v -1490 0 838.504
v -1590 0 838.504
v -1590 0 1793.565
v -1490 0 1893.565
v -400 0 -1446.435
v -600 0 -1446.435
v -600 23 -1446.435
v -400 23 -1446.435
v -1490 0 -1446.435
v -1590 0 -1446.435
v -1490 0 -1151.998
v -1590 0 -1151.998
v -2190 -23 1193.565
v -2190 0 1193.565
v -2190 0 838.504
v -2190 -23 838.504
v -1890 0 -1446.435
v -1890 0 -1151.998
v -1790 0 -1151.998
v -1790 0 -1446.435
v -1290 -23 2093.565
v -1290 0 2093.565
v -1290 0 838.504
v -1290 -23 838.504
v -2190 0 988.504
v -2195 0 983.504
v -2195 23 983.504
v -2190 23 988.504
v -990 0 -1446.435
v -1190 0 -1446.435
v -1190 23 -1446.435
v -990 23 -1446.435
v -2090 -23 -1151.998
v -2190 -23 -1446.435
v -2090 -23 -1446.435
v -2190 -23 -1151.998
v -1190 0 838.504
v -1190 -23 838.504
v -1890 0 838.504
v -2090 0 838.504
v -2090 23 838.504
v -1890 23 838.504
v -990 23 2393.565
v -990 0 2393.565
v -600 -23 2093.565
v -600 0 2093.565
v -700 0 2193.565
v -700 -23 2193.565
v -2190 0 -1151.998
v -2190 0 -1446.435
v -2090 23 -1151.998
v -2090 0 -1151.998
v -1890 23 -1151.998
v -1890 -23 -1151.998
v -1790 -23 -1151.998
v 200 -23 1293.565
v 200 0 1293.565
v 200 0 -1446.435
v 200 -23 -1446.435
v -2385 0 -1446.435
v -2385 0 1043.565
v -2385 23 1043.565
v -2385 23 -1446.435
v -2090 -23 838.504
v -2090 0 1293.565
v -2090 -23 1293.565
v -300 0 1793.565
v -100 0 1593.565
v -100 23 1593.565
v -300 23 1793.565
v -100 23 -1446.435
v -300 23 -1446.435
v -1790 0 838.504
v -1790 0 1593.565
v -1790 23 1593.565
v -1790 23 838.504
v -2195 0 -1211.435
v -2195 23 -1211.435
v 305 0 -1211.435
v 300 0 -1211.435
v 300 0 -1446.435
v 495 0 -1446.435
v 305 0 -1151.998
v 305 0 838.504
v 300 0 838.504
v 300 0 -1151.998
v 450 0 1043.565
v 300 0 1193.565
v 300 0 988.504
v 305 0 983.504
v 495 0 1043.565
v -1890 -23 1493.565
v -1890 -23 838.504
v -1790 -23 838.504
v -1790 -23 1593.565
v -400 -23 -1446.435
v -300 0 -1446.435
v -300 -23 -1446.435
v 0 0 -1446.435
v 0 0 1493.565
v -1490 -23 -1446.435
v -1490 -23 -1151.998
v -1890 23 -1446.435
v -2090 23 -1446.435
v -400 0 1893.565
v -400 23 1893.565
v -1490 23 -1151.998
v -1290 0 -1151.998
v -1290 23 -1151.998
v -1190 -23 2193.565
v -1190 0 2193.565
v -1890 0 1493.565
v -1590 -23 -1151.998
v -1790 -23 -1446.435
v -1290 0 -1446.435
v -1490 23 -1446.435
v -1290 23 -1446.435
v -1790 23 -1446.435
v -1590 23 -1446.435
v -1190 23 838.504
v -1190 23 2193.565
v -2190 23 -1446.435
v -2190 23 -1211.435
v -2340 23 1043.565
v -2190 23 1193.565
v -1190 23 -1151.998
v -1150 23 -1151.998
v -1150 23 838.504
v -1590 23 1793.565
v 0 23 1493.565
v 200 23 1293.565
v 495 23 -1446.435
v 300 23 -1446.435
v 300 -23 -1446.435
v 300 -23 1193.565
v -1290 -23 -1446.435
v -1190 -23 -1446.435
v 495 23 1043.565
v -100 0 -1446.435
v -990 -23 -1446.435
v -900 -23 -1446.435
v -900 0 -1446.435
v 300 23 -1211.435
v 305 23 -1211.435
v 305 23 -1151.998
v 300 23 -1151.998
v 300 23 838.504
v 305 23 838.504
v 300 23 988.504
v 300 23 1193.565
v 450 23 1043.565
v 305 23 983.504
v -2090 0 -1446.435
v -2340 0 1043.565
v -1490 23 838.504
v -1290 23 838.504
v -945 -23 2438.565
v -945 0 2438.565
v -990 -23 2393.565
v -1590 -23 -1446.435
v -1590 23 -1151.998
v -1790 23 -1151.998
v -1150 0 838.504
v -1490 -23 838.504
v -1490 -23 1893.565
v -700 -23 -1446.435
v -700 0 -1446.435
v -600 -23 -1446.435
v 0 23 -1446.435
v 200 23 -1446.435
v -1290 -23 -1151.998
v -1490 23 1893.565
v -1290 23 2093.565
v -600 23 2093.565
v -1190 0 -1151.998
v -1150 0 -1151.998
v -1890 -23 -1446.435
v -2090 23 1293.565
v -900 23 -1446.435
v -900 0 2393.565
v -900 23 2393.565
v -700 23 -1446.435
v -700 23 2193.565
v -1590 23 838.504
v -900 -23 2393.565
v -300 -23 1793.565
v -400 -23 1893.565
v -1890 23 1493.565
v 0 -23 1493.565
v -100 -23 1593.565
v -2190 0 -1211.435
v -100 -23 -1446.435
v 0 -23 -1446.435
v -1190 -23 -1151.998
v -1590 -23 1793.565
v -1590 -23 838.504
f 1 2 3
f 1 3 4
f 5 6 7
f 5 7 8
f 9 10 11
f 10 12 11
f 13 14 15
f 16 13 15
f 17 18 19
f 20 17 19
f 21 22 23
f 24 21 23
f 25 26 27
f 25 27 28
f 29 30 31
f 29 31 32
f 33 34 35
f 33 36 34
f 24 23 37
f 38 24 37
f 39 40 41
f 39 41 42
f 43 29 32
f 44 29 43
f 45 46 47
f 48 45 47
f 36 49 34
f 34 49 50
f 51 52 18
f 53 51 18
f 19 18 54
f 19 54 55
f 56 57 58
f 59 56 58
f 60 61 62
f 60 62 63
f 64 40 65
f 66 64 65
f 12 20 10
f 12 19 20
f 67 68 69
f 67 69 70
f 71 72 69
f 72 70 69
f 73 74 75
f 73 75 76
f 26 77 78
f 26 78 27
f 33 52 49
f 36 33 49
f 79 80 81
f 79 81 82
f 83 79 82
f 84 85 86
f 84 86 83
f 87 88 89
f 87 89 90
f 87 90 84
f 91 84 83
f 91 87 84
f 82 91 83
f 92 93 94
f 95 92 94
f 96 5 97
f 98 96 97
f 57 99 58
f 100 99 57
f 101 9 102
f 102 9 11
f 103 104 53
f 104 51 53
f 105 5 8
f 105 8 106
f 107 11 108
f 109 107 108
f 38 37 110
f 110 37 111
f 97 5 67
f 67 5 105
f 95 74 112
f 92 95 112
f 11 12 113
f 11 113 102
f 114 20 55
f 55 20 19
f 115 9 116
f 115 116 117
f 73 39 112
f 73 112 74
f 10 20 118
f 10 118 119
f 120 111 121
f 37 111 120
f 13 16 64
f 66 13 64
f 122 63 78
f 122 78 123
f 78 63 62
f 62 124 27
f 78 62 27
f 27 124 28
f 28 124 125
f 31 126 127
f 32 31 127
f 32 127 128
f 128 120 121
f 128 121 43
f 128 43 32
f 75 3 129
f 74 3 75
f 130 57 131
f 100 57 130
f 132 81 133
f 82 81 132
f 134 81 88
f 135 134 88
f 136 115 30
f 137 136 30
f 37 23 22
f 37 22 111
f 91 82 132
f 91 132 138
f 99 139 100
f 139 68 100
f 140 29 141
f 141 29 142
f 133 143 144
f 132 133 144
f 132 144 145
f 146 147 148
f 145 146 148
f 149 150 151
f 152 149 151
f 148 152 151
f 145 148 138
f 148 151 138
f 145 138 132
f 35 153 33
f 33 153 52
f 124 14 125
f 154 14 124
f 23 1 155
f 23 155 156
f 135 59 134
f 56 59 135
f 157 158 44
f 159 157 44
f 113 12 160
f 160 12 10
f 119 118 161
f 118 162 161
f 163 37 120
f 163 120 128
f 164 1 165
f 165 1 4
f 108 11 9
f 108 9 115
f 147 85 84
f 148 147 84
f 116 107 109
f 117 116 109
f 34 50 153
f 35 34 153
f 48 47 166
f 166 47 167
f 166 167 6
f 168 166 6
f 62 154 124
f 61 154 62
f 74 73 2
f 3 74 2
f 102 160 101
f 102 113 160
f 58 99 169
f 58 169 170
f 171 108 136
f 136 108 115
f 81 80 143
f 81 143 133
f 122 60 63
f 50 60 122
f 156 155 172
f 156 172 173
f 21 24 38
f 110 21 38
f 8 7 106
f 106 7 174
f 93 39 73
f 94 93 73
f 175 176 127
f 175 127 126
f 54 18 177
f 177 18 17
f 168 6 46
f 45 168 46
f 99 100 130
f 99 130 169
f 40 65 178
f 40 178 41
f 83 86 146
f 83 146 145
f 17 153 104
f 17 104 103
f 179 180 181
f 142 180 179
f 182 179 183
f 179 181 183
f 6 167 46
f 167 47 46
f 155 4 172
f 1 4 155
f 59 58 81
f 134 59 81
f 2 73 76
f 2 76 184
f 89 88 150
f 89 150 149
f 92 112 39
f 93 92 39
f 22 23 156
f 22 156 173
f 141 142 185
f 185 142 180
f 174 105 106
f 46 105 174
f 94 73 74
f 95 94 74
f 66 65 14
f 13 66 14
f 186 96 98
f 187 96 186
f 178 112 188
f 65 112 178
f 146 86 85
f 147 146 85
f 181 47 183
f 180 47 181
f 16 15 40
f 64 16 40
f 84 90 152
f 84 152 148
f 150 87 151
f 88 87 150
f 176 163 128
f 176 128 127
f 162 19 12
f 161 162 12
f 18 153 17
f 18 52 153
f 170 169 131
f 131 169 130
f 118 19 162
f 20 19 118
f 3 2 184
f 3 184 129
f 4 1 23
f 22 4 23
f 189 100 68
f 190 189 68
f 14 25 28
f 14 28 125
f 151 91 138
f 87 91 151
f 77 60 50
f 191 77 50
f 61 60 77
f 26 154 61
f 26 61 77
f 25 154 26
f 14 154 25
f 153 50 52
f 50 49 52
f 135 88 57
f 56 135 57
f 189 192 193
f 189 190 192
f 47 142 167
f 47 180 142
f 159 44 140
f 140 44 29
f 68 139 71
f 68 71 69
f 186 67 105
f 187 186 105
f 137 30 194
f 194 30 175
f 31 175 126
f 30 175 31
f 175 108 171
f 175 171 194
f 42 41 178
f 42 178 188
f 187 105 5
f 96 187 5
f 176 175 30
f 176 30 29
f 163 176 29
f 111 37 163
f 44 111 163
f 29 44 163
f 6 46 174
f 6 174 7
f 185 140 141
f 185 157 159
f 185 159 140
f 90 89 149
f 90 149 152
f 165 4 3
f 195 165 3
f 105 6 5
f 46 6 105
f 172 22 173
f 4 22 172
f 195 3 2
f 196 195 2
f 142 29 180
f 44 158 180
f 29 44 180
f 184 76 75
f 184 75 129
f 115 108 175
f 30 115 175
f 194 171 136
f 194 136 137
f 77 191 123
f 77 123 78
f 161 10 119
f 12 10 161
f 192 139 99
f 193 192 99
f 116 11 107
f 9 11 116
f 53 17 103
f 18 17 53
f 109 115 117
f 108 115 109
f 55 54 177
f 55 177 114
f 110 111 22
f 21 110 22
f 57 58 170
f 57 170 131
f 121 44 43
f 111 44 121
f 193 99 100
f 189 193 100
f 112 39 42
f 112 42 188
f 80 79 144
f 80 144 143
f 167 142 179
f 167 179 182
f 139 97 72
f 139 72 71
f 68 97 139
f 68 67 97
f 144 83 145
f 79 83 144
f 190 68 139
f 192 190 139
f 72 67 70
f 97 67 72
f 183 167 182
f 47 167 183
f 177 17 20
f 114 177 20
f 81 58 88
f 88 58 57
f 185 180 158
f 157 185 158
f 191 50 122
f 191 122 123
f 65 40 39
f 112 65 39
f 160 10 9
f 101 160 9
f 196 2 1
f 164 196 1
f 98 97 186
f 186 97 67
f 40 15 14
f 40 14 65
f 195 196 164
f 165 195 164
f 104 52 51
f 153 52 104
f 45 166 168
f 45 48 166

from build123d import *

# Parameters (mm, degrees)
F0_W     = 5
F0_H     = 1990.5023168359
F0_W_2   = 150
F0_H_2   = 90
F1_DEPTH = 23
F0_W_3   = 200
F0_H_3   = 60.0609665441
F0_H_4   = 145
F0_H_5   = 59.43671662
F0_W_4   = 60
F0_W_5   = 40
F0_W_6   = 100
F2_DEPTH = 23
F0_W_7   = 90


with BuildPart() as f1:
    # F0 (on Front) → F1 (new body)
    with BuildSketch(Plane.XZ):
        Polygon((450, 1043.5651211104), (450, -1356.4348788896), (450, -1446.4348788896), (495, -1446.4348788896), (495, 1043.5651211104), align=None)
        Polygon((300, -1211.4348788896), (300, -1356.4348788896), (450, -1356.4348788896), (450, 1043.5651211104), (300, 1043.5651211104), (300, 988.5041545663), (305, 983.5041545663), (305, 838.5041545663), (305, -1151.9981622696), (305, -1211.4348788896), align=None)
        with Locations((302.5, -156.7470038516)):
            Rectangle(F0_W, F0_H)
        Polygon((450, 1043.5651211104), (300, 1193.5651211104), (300, 1043.5651211104), align=None)
        with Locations((375, -1401.4348788896)):
            Rectangle(F0_W_2, F0_H_2)
    extrude(amount=-F1_DEPTH)


with BuildPart() as f1b:
    # F0 (on Front) → F1, piece 2 (new body)
    with BuildSketch(Plane.XZ):
        Polygon((200, 1293.5651211104), (0, 1493.5651211104), (0, 1288.5041545663), (200, 1088.5041545663), align=None)
        Polygon((0, 1288.5041545663), (0, 1043.5651211104), (200, 1043.5651211104), (200, 1088.5041545663), align=None)
        with Locations((100, 1013.5346378384)):
            Rectangle(F0_W_3, F0_H_3)
        with Locations((100, 911.0041545663)):
            Rectangle(F0_W_3, F0_H_4)
        with Locations((100, -156.7470038516)):
            Rectangle(F0_W_3, F0_H)
        with Locations((100, -1181.7165205796)):
            Rectangle(F0_W_3, F0_H_5)
        with Locations((100, -1283.9348788896)):
            Rectangle(F0_W_3, F0_H_4)
        with Locations((100, -1401.4348788896)):
            Rectangle(F0_W_3, F0_H_2)
    extrude(amount=-F1_DEPTH)


with BuildPart() as f1c:
    # F0 (on Front) → F1, piece 3 (new body)
    with BuildSketch(Plane.XZ):
        with Locations((-200, -1401.4348788896)):
            Rectangle(F0_W_3, F0_H_2)
        with Locations((-200, -1283.9348788896)):
            Rectangle(F0_W_3, F0_H_4)
        with Locations((-200, -1181.7165205796)):
            Rectangle(F0_W_3, F0_H_5)
        with Locations((-200, -156.7470038516)):
            Rectangle(F0_W_3, F0_H)
        with Locations((-200, 911.0041545663)):
            Rectangle(F0_W_3, F0_H_4)
        with Locations((-200, 1013.5346378384)):
            Rectangle(F0_W_3, F0_H_3)
        Polygon((-300, 1588.5041545663), (-300, 1043.5651211104), (-100, 1043.5651211104), (-100, 1388.5041545663), align=None)
        Polygon((-100, 1593.5651211104), (-300, 1793.5651211104), (-300, 1588.5041545663), (-100, 1388.5041545663), align=None)
    extrude(amount=-F1_DEPTH)


with BuildPart() as f1d:
    # F0 (on Front) → F1, piece 4 (new body)
    with BuildSketch(Plane.XZ):
        Polygon((-400, 1893.5651211104), (-600, 2093.5651211104), (-600, 1888.5041545663), (-400, 1688.5041545663), align=None)
        Polygon((-600, 1888.5041545663), (-600, 1043.5651211104), (-400, 1043.5651211104), (-400, 1688.5041545663), align=None)
        with Locations((-500, 1013.5346378384)):
            Rectangle(F0_W_3, F0_H_3)
        with Locations((-500, 911.0041545663)):
            Rectangle(F0_W_3, F0_H_4)
        with Locations((-500, -156.7470038516)):
            Rectangle(F0_W_3, F0_H)
        with Locations((-500, -1181.7165205796)):
            Rectangle(F0_W_3, F0_H_5)
        with Locations((-500, -1283.9348788896)):
            Rectangle(F0_W_3, F0_H_4)
        with Locations((-500, -1401.4348788896)):
            Rectangle(F0_W_3, F0_H_2)
    extrude(amount=-F1_DEPTH)


with BuildPart() as f1e:
    # F0 (on Front) → F1, piece 5 (new body)
    with BuildSketch(Plane.XZ):
        with Locations((-800, -1401.4348788896)):
            Rectangle(F0_W_3, F0_H_2)
        with Locations((-800, -1283.9348788896)):
            Rectangle(F0_W_3, F0_H_4)
        with Locations((-800, -1181.7165205796)):
            Rectangle(F0_W_3, F0_H_5)
        with Locations((-800, -156.7470038516)):
            Rectangle(F0_W_3, F0_H)
        with Locations((-800, 911.0041545663)):
            Rectangle(F0_W_3, F0_H_4)
        with Locations((-800, 1013.5346378384)):
            Rectangle(F0_W_3, F0_H_3)
        Polygon((-900, 2188.5041545663), (-900, 1043.5651211104), (-700, 1043.5651211104), (-700, 1988.5041545663), align=None)
        Polygon((-700, 2193.5651211104), (-900, 2393.5651211104), (-900, 2188.5041545663), (-700, 1988.5041545663), align=None)
    extrude(amount=-F1_DEPTH)


with BuildPart() as f1f:
    # F0 (on Front) → F1, piece 6 (new body)
    with BuildSketch(Plane.XZ):
        Polygon((-990, 2393.5651211104), (-1190, 2193.5651211104), (-1190, 1988.5041545663), (-990, 2188.5041545663), align=None)
        Polygon((-1190, 1988.5041545663), (-1190, 1043.5651211104), (-990, 1043.5651211104), (-990, 2188.5041545663), align=None)
        with Locations((-1090, 1013.5346378384)):
            Rectangle(F0_W_3, F0_H_3)
        Polygon((-990, 983.5041545663), (-1190, 983.5041545663), (-1190, 838.5041545663), (-1150, 838.5041545663), (-990, 838.5041545663), align=None)
        Polygon((-990, -1151.9981622696), (-990, 838.5041545663), (-1150, 838.5041545663), (-1150, 793.5041545663), (-1150, -1106.9981622696), (-1150, -1151.9981622696), align=None)
        with Locations((-1090, -1283.9348788896)):
            Rectangle(F0_W_3, F0_H_4)
        Polygon((-1190, -1151.9981622696), (-1190, -1211.4348788896), (-990, -1211.4348788896), (-990, -1151.9981622696), (-1150, -1151.9981622696), align=None)
        with Locations((-1090, -1401.4348788896)):
            Rectangle(F0_W_3, F0_H_2)
    extrude(amount=-F1_DEPTH)


with BuildPart() as f1g:
    # F0 (on Front) → F1, piece 7 (new body)
    with BuildSketch(Plane.XZ):
        with Locations((-1390, -1283.9348788896)):
            Rectangle(F0_W_3, F0_H_4)
        with Locations((-1390, -1181.7165205796)):
            Rectangle(F0_W_3, F0_H_5)
        with Locations((-1390, -1401.4348788896)):
            Rectangle(F0_W_3, F0_H_2)
    extrude(amount=-F1_DEPTH)


with BuildPart() as f1h:
    # F0 (on Front) → F1, piece 8 (new body)
    with BuildSketch(Plane.XZ):
        with Locations((-1690, -1401.4348788896)):
            Rectangle(F0_W_3, F0_H_2)
        with Locations((-1690, -1283.9348788896)):
            Rectangle(F0_W_3, F0_H_4)
        with Locations((-1690, -1181.7165205796)):
            Rectangle(F0_W_3, F0_H_5)
    extrude(amount=-F1_DEPTH)


with BuildPart() as f1i:
    # F0 (on Front) → F1, piece 9 (new body)
    with BuildSketch(Plane.XZ):
        with Locations((-1990, -1401.4348788896)):
            Rectangle(F0_W_3, F0_H_2)
        with Locations((-1990, -1283.9348788896)):
            Rectangle(F0_W_3, F0_H_4)
        with Locations((-1990, -1181.7165205796)):
            Rectangle(F0_W_3, F0_H_5)
    extrude(amount=-F1_DEPTH)


with BuildPart() as f1j:
    # F0 (on Front) → F1, piece 10 (new body)
    with BuildSketch(Plane.XZ):
        with Locations((-2265, -1401.4348788896)):
            Rectangle(F0_W_2, F0_H_2)
        Polygon((-2340, -1356.4348788896), (-2340, 1043.5651211104), (-2385, 1043.5651211104), (-2385, -1446.4348788896), (-2340, -1446.4348788896), align=None)
        Polygon((-2190, 1043.5651211104), (-2340, 1043.5651211104), (-2340, -1356.4348788896), (-2190, -1356.4348788896), (-2190, -1211.4348788896), (-2195, -1211.4348788896), (-2195, -1151.9981622696), (-2195, 838.5041545663), (-2195, 983.5041545663), (-2190, 988.5041545663), align=None)
        Polygon((-2190, 1193.5651211104), (-2340, 1043.5651211104), (-2190, 1043.5651211104), align=None)
    extrude(amount=-F1_DEPTH)


with BuildPart() as f1k:
    # F0 (on Front) → F1, piece 11 (new body)
    with BuildSketch(Plane.XZ):
        Polygon((-1890, 1493.5651211104), (-2090, 1293.5651211104), (-2090, 1088.5041545663), (-1890, 1288.5041545663), align=None)
        Polygon((-2090, 1088.5041545663), (-2090, 1043.5651211104), (-1890, 1043.5651211104), (-1890, 1288.5041545663), align=None)
        with Locations((-1990, 1013.5346378384)):
            Rectangle(F0_W_3, F0_H_3)
        with Locations((-1990, 911.0041545663)):
            Rectangle(F0_W_3, F0_H_4)
    extrude(amount=-F1_DEPTH)


with BuildPart() as f1l:
    # F0 (on Front) → F1, piece 12 (new body)
    with BuildSketch(Plane.XZ):
        Polygon((-1790, 1388.5041545663), (-1790, 1043.5651211104), (-1590, 1043.5651211104), (-1590, 1588.5041545663), align=None)
        Polygon((-1590, 1793.5651211104), (-1790, 1593.5651211104), (-1790, 1388.5041545663), (-1590, 1588.5041545663), align=None)
        with Locations((-1690, 1013.5346378384)):
            Rectangle(F0_W_3, F0_H_3)
        with Locations((-1690, 911.0041545663)):
            Rectangle(F0_W_3, F0_H_4)
    extrude(amount=-F1_DEPTH)


with BuildPart() as f1m:
    # F0 (on Front) → F1, piece 13 (new body)
    with BuildSketch(Plane.XZ):
        Polygon((-1490, 1688.5041545663), (-1490, 1043.5651211104), (-1290, 1043.5651211104), (-1290, 1888.5041545663), align=None)
        Polygon((-1290, 2093.5651211104), (-1490, 1893.5651211104), (-1490, 1688.5041545663), (-1290, 1888.5041545663), align=None)
        with Locations((-1390, 1013.5346378384)):
            Rectangle(F0_W_3, F0_H_3)
        with Locations((-1390, 911.0041545663)):
            Rectangle(F0_W_3, F0_H_4)
    extrude(amount=-F1_DEPTH)


with BuildPart() as f2:
    # F0 (on Front) → F2 (new body)
    with BuildSketch(Plane.XZ):
        Polygon((300, 1193.5651211104), (200, 1293.5651211104), (200, 1088.5041545663), (244.9390334559, 1043.5651211104), (300, 1043.5651211104), align=None)
        Polygon((244.9390334559, 1043.5651211104), (200, 1043.5651211104), (200, 983.5041545663), (300, 983.5041545663), (300, 988.5041545663), align=None)
        Polygon((200, 1088.5041545663), (200, 1043.5651211104), (244.9390334559, 1043.5651211104), align=None)
        Polygon((300, 1043.5651211104), (244.9390334559, 1043.5651211104), (300, 988.5041545663), align=None)
        Polygon((300, 983.5041545663), (200, 983.5041545663), (200, 838.5041545663), (260, 838.5041545663), (300, 838.5041545663), align=None)
        with Locations((230, -156.7470038516)):
            Rectangle(F0_W_4, F0_H)
        with Locations((280, -156.7470038516)):
            Rectangle(F0_W_5, F0_H)
        Polygon((200, -1151.9981622696), (200, -1211.4348788896), (300, -1211.4348788896), (300, -1151.9981622696), (260, -1151.9981622696), align=None)
        with Locations((250, -1283.9348788896)):
            Rectangle(F0_W_6, F0_H_4)
        with Locations((250, -1401.4348788896)):
            Rectangle(F0_W_6, F0_H_2)
    extrude(amount=F2_DEPTH)


with BuildPart() as f2b:
    # F0 (on Front) → F2, piece 2 (new body)
    with BuildSketch(Plane.XZ):
        with Locations((-50, -1401.4348788896)):
            Rectangle(F0_W_6, F0_H_2)
        with Locations((-50, -1283.9348788896)):
            Rectangle(F0_W_6, F0_H_4)
        with Locations((-50, -1181.7165205796)):
            Rectangle(F0_W_6, F0_H_5)
        with Locations((-50, -156.7470038516)):
            Rectangle(F0_W_6, F0_H)
        with Locations((-50, 911.0041545663)):
            Rectangle(F0_W_6, F0_H_4)
        with Locations((-50, 1013.5346378384)):
            Rectangle(F0_W_6, F0_H_3)
        Polygon((-100, 1388.5041545663), (-100, 1043.5651211104), (0, 1043.5651211104), (0, 1288.5041545663), align=None)
        Polygon((0, 1493.5651211104), (-100, 1593.5651211104), (-100, 1388.5041545663), (0, 1288.5041545663), align=None)
    extrude(amount=F2_DEPTH)


with BuildPart() as f2c:
    # F0 (on Front) → F2, piece 3 (new body)
    with BuildSketch(Plane.XZ):
        Polygon((-300, 1793.5651211104), (-400, 1893.5651211104), (-400, 1688.5041545663), (-300, 1588.5041545663), align=None)
        Polygon((-400, 1688.5041545663), (-400, 1043.5651211104), (-300, 1043.5651211104), (-300, 1588.5041545663), align=None)
        with Locations((-350, 1013.5346378384)):
            Rectangle(F0_W_6, F0_H_3)
        with Locations((-350, 911.0041545663)):
            Rectangle(F0_W_6, F0_H_4)
        with Locations((-350, -156.7470038516)):
            Rectangle(F0_W_6, F0_H)
        with Locations((-350, -1181.7165205796)):
            Rectangle(F0_W_6, F0_H_5)
        with Locations((-350, -1283.9348788896)):
            Rectangle(F0_W_6, F0_H_4)
        with Locations((-350, -1401.4348788896)):
            Rectangle(F0_W_6, F0_H_2)
    extrude(amount=F2_DEPTH)


with BuildPart() as f2d:
    # F0 (on Front) → F2, piece 4 (new body)
    with BuildSketch(Plane.XZ):
        with Locations((-650, -1401.4348788896)):
            Rectangle(F0_W_6, F0_H_2)
        with Locations((-650, -1283.9348788896)):
            Rectangle(F0_W_6, F0_H_4)
        with Locations((-650, -1181.7165205796)):
            Rectangle(F0_W_6, F0_H_5)
        with Locations((-650, -156.7470038516)):
            Rectangle(F0_W_6, F0_H)
        Polygon((-700, 1988.5041545663), (-700, 1043.5651211104), (-600, 1043.5651211104), (-600, 1888.5041545663), align=None)
        with Locations((-650, 911.0041545663)):
            Rectangle(F0_W_6, F0_H_4)
        with Locations((-650, 1013.5346378384)):
            Rectangle(F0_W_6, F0_H_3)
        Polygon((-600, 2093.5651211104), (-700, 2193.5651211104), (-700, 1988.5041545663), (-600, 1888.5041545663), align=None)
    extrude(amount=F2_DEPTH)


with BuildPart() as f2e:
    # F0 (on Front) → F2, piece 5 (new body)
    with BuildSketch(Plane.XZ):
        with Locations((-945, -1181.7165205796)):
            Rectangle(F0_W_7, F0_H_5)
        with Locations((-945, -1283.9348788896)):
            Rectangle(F0_W_7, F0_H_4)
        with Locations((-945, -1401.4348788896)):
            Rectangle(F0_W_7, F0_H_2)
        with Locations((-945, -156.7470038516)):
            Rectangle(F0_W_7, F0_H)
        Polygon((-990, 2188.5041545663), (-990, 1043.5651211104), (-900, 1043.5651211104), (-900, 2188.5041545663), (-945, 2233.5041545663), align=None)
        with Locations((-945, 911.0041545663)):
            Rectangle(F0_W_7, F0_H_4)
        with Locations((-945, 1013.5346378384)):
            Rectangle(F0_W_7, F0_H_3)
        Polygon((-945, 2438.5651211104), (-990, 2393.5651211104), (-990, 2188.5041545663), (-945, 2233.5041545663), (-900, 2188.5041545663), (-900, 2393.5651211104), align=None)
    extrude(amount=F2_DEPTH)


with BuildPart() as f2f:
    # F0 (on Front) → F2, piece 6 (new body)
    with BuildSketch(Plane.XZ):
        with Locations((-1240, -1181.7165205796)):
            Rectangle(F0_W_6, F0_H_5)
        with Locations((-1240, -1283.9348788896)):
            Rectangle(F0_W_6, F0_H_4)
        with Locations((-1240, -1401.4348788896)):
            Rectangle(F0_W_6, F0_H_2)
    extrude(amount=F2_DEPTH)


with BuildPart() as f2g:
    # F0 (on Front) → F2, piece 7 (new body)
    with BuildSketch(Plane.XZ):
        with Locations((-1540, -1401.4348788896)):
            Rectangle(F0_W_6, F0_H_2)
        with Locations((-1540, -1283.9348788896)):
            Rectangle(F0_W_6, F0_H_4)
        with Locations((-1540, -1181.7165205796)):
            Rectangle(F0_W_6, F0_H_5)
    extrude(amount=F2_DEPTH)


with BuildPart() as f2h:
    # F0 (on Front) → F2, piece 8 (new body)
    with BuildSketch(Plane.XZ):
        with Locations((-1840, -1181.7165205796)):
            Rectangle(F0_W_6, F0_H_5)
        with Locations((-1840, -1283.9348788896)):
            Rectangle(F0_W_6, F0_H_4)
        with Locations((-1840, -1401.4348788896)):
            Rectangle(F0_W_6, F0_H_2)
    extrude(amount=F2_DEPTH)


with BuildPart() as f2i:
    # F0 (on Front) → F2, piece 9 (new body)
    with BuildSketch(Plane.XZ):
        with Locations((-2140, -1401.4348788896)):
            Rectangle(F0_W_6, F0_H_2)
        with Locations((-2140, -1283.9348788896)):
            Rectangle(F0_W_6, F0_H_4)
        Polygon((-2190, -1151.9981622696), (-2190, -1211.4348788896), (-2090, -1211.4348788896), (-2090, -1151.9981622696), (-2150, -1151.9981622696), align=None)
    extrude(amount=F2_DEPTH)


with BuildPart() as f2j:
    # F0 (on Front) → F2, piece 10 (new body)
    with BuildSketch(Plane.XZ):
        Polygon((-1290, 1888.5041545663), (-1290, 1043.5651211104), (-1190, 1043.5651211104), (-1190, 1988.5041545663), align=None)
        Polygon((-1190, 2193.5651211104), (-1290, 2093.5651211104), (-1290, 1888.5041545663), (-1190, 1988.5041545663), align=None)
        with Locations((-1240, 1013.5346378384)):
            Rectangle(F0_W_6, F0_H_3)
        with Locations((-1240, 911.0041545663)):
            Rectangle(F0_W_6, F0_H_4)
    extrude(amount=F2_DEPTH)


with BuildPart() as f2k:
    # F0 (on Front) → F2, piece 11 (new body)
    with BuildSketch(Plane.XZ):
        with Locations((-1540, 911.0041545663)):
            Rectangle(F0_W_6, F0_H_4)
        with Locations((-1540, 1013.5346378384)):
            Rectangle(F0_W_6, F0_H_3)
        Polygon((-1590, 1588.5041545663), (-1590, 1043.5651211104), (-1490, 1043.5651211104), (-1490, 1688.5041545663), align=None)
        Polygon((-1490, 1893.5651211104), (-1590, 1793.5651211104), (-1590, 1588.5041545663), (-1490, 1688.5041545663), align=None)
    extrude(amount=F2_DEPTH)


with BuildPart() as f2l:
    # F0 (on Front) → F2, piece 12 (new body)
    with BuildSketch(Plane.XZ):
        Polygon((-1790, 1593.5651211104), (-1890, 1493.5651211104), (-1890, 1288.5041545663), (-1790, 1388.5041545663), align=None)
        Polygon((-1890, 1288.5041545663), (-1890, 1043.5651211104), (-1790, 1043.5651211104), (-1790, 1388.5041545663), align=None)
        with Locations((-1840, 1013.5346378384)):
            Rectangle(F0_W_6, F0_H_3)
        with Locations((-1840, 911.0041545663)):
            Rectangle(F0_W_6, F0_H_4)
    extrude(amount=F2_DEPTH)


with BuildPart() as f2m:
    # F0 (on Front) → F2, piece 13 (new body)
    with BuildSketch(Plane.XZ):
        Polygon((-2090, 1043.5651211104), (-2134.9390334559, 1043.5651211104), (-2190, 988.5041545663), (-2190, 983.5041545663), (-2090, 983.5041545663), align=None)
        Polygon((-2190, 1193.5651211104), (-2190, 1043.5651211104), (-2134.9390334559, 1043.5651211104), (-2090, 1088.5041545663), (-2090, 1293.5651211104), align=None)
        Polygon((-2134.9390334559, 1043.5651211104), (-2190, 1043.5651211104), (-2190, 988.5041545663), align=None)
        Polygon((-2090, 1088.5041545663), (-2134.9390334559, 1043.5651211104), (-2090, 1043.5651211104), align=None)
        Polygon((-2090, 983.5041545663), (-2190, 983.5041545663), (-2190, 838.5041545663), (-2150, 838.5041545663), (-2090, 838.5041545663), align=None)
    extrude(amount=F2_DEPTH)


solid = Compound([f1.part, f1b.part, f1c.part, f1d.part, f1e.part, f1f.part, f1g.part, f1h.part, f1i.part, f1j.part, f1k.part, f1l.part, f1m.part, f2.part, f2b.part, f2c.part, f2d.part, f2e.part, f2f.part, f2g.part, f2h.part, f2i.part, f2j.part, f2k.part, f2l.part, f2m.part])
